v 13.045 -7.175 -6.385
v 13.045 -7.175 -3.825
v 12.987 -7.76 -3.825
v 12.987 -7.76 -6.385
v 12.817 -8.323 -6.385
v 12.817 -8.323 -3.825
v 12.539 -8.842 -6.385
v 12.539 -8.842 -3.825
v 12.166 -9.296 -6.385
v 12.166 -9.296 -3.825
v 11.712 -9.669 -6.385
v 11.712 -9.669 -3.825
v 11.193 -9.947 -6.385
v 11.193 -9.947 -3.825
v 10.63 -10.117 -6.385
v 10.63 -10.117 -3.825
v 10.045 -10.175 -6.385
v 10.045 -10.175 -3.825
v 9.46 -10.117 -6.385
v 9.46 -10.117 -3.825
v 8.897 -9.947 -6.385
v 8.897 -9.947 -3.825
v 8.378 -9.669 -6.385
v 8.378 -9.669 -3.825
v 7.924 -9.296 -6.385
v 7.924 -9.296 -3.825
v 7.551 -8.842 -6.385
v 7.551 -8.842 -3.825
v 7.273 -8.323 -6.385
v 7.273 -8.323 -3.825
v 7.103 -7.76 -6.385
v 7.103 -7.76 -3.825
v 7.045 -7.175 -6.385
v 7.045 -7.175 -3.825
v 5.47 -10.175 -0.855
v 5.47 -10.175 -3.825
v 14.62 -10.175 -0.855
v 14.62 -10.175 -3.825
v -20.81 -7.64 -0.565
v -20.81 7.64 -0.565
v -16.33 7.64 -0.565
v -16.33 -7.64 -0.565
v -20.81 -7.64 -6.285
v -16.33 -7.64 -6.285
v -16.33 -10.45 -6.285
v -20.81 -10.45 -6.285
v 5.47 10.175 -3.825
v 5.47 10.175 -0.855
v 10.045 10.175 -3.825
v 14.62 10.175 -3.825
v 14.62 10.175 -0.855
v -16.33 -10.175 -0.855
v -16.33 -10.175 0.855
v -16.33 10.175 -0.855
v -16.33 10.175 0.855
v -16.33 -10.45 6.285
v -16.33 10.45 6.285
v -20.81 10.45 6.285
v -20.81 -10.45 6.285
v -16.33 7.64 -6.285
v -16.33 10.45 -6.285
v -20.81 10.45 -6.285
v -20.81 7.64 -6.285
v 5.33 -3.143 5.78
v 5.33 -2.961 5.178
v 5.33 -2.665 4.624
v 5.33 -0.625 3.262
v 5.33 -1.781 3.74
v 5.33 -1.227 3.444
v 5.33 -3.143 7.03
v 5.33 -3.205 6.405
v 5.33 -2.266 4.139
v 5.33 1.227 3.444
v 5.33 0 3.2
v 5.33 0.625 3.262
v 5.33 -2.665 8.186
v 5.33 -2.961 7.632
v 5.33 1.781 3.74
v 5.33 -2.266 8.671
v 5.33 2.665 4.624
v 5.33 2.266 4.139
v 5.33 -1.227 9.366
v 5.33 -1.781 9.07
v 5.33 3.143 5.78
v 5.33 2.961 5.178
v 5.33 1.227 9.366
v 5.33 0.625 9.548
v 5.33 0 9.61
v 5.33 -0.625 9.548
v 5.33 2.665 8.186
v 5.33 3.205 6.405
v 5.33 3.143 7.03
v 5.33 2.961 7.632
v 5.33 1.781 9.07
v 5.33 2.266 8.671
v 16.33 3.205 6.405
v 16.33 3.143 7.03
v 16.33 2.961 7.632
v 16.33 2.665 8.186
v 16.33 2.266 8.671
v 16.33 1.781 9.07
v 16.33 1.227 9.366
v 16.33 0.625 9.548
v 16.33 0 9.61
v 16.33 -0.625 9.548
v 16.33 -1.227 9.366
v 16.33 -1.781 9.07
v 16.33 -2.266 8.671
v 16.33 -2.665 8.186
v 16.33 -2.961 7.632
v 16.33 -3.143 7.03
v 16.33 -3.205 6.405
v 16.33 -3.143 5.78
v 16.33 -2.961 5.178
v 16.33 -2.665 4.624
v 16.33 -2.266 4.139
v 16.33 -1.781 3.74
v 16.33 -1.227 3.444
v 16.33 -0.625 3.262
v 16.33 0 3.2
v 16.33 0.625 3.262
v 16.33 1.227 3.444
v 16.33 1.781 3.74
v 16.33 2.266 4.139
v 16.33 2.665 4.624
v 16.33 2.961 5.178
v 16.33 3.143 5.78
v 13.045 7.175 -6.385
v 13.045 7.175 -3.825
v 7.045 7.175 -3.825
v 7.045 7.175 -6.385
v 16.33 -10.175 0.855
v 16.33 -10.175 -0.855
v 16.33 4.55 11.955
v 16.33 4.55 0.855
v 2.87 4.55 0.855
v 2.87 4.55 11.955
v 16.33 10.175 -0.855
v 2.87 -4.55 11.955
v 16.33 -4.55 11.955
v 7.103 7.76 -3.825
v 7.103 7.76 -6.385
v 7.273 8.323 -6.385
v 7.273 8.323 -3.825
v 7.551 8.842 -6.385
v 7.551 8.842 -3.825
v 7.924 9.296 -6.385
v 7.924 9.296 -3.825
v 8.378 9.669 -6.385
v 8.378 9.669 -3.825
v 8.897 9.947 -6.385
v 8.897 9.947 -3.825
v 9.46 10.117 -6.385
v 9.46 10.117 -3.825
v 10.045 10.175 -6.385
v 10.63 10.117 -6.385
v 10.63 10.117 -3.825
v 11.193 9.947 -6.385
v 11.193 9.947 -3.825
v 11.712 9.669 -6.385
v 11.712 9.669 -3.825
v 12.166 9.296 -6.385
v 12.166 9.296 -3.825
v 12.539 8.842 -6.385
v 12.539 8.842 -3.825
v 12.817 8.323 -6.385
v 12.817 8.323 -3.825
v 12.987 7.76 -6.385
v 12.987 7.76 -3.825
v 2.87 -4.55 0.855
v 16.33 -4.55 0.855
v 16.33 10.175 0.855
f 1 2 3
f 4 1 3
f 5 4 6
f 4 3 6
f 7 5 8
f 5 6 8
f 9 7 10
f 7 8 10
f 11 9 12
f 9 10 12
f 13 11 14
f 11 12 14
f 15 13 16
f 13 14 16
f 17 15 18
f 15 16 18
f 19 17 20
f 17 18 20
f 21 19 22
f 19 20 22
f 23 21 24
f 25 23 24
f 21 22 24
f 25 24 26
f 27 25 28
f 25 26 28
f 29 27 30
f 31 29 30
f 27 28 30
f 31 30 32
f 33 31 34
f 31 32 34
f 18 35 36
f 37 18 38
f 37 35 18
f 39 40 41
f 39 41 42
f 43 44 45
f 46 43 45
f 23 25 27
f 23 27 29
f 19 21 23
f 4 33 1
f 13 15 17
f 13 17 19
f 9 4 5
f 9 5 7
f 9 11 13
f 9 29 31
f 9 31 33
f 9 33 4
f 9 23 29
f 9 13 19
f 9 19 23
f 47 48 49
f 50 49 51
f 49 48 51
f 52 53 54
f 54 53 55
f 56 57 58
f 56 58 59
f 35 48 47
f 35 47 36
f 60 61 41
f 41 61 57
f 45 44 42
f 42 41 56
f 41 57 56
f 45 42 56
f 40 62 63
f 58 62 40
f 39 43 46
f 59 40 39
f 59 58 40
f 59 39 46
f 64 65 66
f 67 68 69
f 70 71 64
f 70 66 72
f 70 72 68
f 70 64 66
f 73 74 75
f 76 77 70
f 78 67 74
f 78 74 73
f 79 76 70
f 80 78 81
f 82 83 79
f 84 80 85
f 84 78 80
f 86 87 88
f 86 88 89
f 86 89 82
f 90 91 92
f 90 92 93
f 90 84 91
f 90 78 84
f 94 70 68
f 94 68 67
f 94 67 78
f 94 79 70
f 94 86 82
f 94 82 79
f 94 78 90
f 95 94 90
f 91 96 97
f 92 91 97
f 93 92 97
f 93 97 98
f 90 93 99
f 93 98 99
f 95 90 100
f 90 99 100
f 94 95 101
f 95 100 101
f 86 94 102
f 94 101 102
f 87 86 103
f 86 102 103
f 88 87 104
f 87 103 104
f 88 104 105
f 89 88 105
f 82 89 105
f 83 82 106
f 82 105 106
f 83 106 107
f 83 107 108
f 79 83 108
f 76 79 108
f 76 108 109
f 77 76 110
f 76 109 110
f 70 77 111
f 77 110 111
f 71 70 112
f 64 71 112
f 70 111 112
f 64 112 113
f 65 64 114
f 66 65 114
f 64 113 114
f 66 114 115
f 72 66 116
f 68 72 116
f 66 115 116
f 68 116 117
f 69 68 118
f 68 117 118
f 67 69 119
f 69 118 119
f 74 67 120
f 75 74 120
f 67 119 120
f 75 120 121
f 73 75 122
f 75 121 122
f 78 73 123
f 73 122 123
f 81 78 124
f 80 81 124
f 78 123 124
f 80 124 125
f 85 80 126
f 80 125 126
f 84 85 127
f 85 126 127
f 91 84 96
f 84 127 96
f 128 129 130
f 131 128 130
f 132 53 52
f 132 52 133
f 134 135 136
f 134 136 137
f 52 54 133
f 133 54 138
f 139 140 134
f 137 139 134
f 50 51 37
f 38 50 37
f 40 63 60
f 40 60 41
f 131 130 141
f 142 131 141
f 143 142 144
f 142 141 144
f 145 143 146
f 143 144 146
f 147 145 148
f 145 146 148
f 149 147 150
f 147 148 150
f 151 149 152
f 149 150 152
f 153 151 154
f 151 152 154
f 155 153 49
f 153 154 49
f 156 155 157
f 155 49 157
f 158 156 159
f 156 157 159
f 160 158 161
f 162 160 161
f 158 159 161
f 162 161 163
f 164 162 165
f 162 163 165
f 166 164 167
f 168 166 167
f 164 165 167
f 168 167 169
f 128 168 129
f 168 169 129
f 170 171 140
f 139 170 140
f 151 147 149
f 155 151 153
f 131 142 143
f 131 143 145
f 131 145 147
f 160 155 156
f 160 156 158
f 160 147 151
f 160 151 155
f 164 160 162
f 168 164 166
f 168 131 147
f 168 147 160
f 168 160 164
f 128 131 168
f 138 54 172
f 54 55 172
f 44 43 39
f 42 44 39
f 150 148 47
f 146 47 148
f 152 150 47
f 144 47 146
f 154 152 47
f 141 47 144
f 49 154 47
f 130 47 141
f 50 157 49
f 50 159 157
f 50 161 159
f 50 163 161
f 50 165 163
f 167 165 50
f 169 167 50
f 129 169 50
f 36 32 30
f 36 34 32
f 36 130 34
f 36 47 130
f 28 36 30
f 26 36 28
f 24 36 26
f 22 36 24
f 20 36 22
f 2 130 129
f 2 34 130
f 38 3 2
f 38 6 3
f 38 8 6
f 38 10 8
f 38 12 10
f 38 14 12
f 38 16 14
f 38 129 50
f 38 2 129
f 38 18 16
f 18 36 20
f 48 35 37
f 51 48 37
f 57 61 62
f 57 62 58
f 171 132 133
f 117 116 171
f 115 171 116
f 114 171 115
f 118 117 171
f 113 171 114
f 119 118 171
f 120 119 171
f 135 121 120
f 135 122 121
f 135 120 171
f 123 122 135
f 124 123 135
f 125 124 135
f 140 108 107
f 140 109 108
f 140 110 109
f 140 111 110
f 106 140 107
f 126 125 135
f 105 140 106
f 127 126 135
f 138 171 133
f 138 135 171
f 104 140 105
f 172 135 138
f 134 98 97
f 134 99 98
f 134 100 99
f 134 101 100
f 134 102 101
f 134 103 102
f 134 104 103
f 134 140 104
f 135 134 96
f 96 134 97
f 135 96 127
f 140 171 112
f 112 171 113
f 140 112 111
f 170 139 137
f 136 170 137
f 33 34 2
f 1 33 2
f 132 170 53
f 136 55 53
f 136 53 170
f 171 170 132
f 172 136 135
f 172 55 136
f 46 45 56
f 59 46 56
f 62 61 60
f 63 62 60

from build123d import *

# Parameters (mm, degrees)
F0_W      = 32.66
F0_H      = 20.35
F1_DEPTH  = 0.855
F2_W      = 20.9
F2_H      = 12.57
F3_DEPTH  = 4.48
F4_W      = 15.28
F4_H      = 5.72
F5_DEPTH  = 4.48
F6_W      = 9.15
F6_H      = 20.35
F7_DEPTH  = 2.97
F9_DEPTH  = 2.56
F10_W     = 9.1
F10_H     = 11.1
F11_DEPTH = 13.46
F12_R     = 3.205
F13_DEPTH = 11


with BuildPart() as f1:
    # F0 (on Top) → F1 (new body, symmetric)
    with BuildSketch(Plane.XY):
        Rectangle(F0_W, F0_H)
    extrude(amount=F1_DEPTH, both=True)

    # F10 (on face) → F11 (join)
    with BuildSketch(Plane.YZ.offset(16.33)):
        with Locations((0, 6.405)):
            Rectangle(F10_W, F10_H)
    extrude(amount=-F11_DEPTH)

    # F12 (on face) → F13 (cut)
    with BuildSketch(Plane.YZ.offset(16.33)):
        with Locations((0, 6.405)):
            Circle(F12_R)
    extrude(amount=-F13_DEPTH, mode=Mode.SUBTRACT)


with BuildPart() as f3:
    # F2 (on face) → F3 (new body)
    with BuildSketch(Plane(origin=(-16.33, 0, 0), x_dir=(0, -1, 0), z_dir=(-1, 0, 0))):
        Rectangle(F2_W, F2_H)
    extrude(amount=F3_DEPTH)

    # F4 (on face) → F5 (cut, through all)
    with BuildSketch(Plane(origin=(-20.81, 0, 0), x_dir=(0, -1, 0), z_dir=(-1, 0, 0))):
        with Locations((0, -3.425)):
            Rectangle(F4_W, F4_H)
    extrude(amount=-F5_DEPTH, mode=Mode.SUBTRACT)


with BuildPart() as f7:
    # F6 (on face) → F7 (new body)
    with BuildSketch(Plane(origin=(0, 0, -0.855), x_dir=(1, 0, 0), z_dir=(0, 0, -1))):
        with Locations((10.045, 0)):
            Rectangle(F6_W, F6_H)
    extrude(amount=F7_DEPTH)

    # F8 (on face) → F9 (join)
    with BuildSketch(Plane(origin=(0, 0, -3.825), x_dir=(1, 0, 0), z_dir=(0, 0, -1))):
        with BuildLine():
            Line((7.045, 7.175), (13.045, 7.175))
            ThreePointArc((13.045, 7.175), (10.045, 10.175), (7.045, 7.175))
        make_face()
        with BuildLine():
            ThreePointArc((7.045, -7.175), (10.045, -10.175), (13.045, -7.175))
            Line((13.045, -7.175), (7.045, -7.175))
        make_face()
    extrude(amount=F9_DEPTH)


solid = Compound([f1.part, f3.part, f7.part])
